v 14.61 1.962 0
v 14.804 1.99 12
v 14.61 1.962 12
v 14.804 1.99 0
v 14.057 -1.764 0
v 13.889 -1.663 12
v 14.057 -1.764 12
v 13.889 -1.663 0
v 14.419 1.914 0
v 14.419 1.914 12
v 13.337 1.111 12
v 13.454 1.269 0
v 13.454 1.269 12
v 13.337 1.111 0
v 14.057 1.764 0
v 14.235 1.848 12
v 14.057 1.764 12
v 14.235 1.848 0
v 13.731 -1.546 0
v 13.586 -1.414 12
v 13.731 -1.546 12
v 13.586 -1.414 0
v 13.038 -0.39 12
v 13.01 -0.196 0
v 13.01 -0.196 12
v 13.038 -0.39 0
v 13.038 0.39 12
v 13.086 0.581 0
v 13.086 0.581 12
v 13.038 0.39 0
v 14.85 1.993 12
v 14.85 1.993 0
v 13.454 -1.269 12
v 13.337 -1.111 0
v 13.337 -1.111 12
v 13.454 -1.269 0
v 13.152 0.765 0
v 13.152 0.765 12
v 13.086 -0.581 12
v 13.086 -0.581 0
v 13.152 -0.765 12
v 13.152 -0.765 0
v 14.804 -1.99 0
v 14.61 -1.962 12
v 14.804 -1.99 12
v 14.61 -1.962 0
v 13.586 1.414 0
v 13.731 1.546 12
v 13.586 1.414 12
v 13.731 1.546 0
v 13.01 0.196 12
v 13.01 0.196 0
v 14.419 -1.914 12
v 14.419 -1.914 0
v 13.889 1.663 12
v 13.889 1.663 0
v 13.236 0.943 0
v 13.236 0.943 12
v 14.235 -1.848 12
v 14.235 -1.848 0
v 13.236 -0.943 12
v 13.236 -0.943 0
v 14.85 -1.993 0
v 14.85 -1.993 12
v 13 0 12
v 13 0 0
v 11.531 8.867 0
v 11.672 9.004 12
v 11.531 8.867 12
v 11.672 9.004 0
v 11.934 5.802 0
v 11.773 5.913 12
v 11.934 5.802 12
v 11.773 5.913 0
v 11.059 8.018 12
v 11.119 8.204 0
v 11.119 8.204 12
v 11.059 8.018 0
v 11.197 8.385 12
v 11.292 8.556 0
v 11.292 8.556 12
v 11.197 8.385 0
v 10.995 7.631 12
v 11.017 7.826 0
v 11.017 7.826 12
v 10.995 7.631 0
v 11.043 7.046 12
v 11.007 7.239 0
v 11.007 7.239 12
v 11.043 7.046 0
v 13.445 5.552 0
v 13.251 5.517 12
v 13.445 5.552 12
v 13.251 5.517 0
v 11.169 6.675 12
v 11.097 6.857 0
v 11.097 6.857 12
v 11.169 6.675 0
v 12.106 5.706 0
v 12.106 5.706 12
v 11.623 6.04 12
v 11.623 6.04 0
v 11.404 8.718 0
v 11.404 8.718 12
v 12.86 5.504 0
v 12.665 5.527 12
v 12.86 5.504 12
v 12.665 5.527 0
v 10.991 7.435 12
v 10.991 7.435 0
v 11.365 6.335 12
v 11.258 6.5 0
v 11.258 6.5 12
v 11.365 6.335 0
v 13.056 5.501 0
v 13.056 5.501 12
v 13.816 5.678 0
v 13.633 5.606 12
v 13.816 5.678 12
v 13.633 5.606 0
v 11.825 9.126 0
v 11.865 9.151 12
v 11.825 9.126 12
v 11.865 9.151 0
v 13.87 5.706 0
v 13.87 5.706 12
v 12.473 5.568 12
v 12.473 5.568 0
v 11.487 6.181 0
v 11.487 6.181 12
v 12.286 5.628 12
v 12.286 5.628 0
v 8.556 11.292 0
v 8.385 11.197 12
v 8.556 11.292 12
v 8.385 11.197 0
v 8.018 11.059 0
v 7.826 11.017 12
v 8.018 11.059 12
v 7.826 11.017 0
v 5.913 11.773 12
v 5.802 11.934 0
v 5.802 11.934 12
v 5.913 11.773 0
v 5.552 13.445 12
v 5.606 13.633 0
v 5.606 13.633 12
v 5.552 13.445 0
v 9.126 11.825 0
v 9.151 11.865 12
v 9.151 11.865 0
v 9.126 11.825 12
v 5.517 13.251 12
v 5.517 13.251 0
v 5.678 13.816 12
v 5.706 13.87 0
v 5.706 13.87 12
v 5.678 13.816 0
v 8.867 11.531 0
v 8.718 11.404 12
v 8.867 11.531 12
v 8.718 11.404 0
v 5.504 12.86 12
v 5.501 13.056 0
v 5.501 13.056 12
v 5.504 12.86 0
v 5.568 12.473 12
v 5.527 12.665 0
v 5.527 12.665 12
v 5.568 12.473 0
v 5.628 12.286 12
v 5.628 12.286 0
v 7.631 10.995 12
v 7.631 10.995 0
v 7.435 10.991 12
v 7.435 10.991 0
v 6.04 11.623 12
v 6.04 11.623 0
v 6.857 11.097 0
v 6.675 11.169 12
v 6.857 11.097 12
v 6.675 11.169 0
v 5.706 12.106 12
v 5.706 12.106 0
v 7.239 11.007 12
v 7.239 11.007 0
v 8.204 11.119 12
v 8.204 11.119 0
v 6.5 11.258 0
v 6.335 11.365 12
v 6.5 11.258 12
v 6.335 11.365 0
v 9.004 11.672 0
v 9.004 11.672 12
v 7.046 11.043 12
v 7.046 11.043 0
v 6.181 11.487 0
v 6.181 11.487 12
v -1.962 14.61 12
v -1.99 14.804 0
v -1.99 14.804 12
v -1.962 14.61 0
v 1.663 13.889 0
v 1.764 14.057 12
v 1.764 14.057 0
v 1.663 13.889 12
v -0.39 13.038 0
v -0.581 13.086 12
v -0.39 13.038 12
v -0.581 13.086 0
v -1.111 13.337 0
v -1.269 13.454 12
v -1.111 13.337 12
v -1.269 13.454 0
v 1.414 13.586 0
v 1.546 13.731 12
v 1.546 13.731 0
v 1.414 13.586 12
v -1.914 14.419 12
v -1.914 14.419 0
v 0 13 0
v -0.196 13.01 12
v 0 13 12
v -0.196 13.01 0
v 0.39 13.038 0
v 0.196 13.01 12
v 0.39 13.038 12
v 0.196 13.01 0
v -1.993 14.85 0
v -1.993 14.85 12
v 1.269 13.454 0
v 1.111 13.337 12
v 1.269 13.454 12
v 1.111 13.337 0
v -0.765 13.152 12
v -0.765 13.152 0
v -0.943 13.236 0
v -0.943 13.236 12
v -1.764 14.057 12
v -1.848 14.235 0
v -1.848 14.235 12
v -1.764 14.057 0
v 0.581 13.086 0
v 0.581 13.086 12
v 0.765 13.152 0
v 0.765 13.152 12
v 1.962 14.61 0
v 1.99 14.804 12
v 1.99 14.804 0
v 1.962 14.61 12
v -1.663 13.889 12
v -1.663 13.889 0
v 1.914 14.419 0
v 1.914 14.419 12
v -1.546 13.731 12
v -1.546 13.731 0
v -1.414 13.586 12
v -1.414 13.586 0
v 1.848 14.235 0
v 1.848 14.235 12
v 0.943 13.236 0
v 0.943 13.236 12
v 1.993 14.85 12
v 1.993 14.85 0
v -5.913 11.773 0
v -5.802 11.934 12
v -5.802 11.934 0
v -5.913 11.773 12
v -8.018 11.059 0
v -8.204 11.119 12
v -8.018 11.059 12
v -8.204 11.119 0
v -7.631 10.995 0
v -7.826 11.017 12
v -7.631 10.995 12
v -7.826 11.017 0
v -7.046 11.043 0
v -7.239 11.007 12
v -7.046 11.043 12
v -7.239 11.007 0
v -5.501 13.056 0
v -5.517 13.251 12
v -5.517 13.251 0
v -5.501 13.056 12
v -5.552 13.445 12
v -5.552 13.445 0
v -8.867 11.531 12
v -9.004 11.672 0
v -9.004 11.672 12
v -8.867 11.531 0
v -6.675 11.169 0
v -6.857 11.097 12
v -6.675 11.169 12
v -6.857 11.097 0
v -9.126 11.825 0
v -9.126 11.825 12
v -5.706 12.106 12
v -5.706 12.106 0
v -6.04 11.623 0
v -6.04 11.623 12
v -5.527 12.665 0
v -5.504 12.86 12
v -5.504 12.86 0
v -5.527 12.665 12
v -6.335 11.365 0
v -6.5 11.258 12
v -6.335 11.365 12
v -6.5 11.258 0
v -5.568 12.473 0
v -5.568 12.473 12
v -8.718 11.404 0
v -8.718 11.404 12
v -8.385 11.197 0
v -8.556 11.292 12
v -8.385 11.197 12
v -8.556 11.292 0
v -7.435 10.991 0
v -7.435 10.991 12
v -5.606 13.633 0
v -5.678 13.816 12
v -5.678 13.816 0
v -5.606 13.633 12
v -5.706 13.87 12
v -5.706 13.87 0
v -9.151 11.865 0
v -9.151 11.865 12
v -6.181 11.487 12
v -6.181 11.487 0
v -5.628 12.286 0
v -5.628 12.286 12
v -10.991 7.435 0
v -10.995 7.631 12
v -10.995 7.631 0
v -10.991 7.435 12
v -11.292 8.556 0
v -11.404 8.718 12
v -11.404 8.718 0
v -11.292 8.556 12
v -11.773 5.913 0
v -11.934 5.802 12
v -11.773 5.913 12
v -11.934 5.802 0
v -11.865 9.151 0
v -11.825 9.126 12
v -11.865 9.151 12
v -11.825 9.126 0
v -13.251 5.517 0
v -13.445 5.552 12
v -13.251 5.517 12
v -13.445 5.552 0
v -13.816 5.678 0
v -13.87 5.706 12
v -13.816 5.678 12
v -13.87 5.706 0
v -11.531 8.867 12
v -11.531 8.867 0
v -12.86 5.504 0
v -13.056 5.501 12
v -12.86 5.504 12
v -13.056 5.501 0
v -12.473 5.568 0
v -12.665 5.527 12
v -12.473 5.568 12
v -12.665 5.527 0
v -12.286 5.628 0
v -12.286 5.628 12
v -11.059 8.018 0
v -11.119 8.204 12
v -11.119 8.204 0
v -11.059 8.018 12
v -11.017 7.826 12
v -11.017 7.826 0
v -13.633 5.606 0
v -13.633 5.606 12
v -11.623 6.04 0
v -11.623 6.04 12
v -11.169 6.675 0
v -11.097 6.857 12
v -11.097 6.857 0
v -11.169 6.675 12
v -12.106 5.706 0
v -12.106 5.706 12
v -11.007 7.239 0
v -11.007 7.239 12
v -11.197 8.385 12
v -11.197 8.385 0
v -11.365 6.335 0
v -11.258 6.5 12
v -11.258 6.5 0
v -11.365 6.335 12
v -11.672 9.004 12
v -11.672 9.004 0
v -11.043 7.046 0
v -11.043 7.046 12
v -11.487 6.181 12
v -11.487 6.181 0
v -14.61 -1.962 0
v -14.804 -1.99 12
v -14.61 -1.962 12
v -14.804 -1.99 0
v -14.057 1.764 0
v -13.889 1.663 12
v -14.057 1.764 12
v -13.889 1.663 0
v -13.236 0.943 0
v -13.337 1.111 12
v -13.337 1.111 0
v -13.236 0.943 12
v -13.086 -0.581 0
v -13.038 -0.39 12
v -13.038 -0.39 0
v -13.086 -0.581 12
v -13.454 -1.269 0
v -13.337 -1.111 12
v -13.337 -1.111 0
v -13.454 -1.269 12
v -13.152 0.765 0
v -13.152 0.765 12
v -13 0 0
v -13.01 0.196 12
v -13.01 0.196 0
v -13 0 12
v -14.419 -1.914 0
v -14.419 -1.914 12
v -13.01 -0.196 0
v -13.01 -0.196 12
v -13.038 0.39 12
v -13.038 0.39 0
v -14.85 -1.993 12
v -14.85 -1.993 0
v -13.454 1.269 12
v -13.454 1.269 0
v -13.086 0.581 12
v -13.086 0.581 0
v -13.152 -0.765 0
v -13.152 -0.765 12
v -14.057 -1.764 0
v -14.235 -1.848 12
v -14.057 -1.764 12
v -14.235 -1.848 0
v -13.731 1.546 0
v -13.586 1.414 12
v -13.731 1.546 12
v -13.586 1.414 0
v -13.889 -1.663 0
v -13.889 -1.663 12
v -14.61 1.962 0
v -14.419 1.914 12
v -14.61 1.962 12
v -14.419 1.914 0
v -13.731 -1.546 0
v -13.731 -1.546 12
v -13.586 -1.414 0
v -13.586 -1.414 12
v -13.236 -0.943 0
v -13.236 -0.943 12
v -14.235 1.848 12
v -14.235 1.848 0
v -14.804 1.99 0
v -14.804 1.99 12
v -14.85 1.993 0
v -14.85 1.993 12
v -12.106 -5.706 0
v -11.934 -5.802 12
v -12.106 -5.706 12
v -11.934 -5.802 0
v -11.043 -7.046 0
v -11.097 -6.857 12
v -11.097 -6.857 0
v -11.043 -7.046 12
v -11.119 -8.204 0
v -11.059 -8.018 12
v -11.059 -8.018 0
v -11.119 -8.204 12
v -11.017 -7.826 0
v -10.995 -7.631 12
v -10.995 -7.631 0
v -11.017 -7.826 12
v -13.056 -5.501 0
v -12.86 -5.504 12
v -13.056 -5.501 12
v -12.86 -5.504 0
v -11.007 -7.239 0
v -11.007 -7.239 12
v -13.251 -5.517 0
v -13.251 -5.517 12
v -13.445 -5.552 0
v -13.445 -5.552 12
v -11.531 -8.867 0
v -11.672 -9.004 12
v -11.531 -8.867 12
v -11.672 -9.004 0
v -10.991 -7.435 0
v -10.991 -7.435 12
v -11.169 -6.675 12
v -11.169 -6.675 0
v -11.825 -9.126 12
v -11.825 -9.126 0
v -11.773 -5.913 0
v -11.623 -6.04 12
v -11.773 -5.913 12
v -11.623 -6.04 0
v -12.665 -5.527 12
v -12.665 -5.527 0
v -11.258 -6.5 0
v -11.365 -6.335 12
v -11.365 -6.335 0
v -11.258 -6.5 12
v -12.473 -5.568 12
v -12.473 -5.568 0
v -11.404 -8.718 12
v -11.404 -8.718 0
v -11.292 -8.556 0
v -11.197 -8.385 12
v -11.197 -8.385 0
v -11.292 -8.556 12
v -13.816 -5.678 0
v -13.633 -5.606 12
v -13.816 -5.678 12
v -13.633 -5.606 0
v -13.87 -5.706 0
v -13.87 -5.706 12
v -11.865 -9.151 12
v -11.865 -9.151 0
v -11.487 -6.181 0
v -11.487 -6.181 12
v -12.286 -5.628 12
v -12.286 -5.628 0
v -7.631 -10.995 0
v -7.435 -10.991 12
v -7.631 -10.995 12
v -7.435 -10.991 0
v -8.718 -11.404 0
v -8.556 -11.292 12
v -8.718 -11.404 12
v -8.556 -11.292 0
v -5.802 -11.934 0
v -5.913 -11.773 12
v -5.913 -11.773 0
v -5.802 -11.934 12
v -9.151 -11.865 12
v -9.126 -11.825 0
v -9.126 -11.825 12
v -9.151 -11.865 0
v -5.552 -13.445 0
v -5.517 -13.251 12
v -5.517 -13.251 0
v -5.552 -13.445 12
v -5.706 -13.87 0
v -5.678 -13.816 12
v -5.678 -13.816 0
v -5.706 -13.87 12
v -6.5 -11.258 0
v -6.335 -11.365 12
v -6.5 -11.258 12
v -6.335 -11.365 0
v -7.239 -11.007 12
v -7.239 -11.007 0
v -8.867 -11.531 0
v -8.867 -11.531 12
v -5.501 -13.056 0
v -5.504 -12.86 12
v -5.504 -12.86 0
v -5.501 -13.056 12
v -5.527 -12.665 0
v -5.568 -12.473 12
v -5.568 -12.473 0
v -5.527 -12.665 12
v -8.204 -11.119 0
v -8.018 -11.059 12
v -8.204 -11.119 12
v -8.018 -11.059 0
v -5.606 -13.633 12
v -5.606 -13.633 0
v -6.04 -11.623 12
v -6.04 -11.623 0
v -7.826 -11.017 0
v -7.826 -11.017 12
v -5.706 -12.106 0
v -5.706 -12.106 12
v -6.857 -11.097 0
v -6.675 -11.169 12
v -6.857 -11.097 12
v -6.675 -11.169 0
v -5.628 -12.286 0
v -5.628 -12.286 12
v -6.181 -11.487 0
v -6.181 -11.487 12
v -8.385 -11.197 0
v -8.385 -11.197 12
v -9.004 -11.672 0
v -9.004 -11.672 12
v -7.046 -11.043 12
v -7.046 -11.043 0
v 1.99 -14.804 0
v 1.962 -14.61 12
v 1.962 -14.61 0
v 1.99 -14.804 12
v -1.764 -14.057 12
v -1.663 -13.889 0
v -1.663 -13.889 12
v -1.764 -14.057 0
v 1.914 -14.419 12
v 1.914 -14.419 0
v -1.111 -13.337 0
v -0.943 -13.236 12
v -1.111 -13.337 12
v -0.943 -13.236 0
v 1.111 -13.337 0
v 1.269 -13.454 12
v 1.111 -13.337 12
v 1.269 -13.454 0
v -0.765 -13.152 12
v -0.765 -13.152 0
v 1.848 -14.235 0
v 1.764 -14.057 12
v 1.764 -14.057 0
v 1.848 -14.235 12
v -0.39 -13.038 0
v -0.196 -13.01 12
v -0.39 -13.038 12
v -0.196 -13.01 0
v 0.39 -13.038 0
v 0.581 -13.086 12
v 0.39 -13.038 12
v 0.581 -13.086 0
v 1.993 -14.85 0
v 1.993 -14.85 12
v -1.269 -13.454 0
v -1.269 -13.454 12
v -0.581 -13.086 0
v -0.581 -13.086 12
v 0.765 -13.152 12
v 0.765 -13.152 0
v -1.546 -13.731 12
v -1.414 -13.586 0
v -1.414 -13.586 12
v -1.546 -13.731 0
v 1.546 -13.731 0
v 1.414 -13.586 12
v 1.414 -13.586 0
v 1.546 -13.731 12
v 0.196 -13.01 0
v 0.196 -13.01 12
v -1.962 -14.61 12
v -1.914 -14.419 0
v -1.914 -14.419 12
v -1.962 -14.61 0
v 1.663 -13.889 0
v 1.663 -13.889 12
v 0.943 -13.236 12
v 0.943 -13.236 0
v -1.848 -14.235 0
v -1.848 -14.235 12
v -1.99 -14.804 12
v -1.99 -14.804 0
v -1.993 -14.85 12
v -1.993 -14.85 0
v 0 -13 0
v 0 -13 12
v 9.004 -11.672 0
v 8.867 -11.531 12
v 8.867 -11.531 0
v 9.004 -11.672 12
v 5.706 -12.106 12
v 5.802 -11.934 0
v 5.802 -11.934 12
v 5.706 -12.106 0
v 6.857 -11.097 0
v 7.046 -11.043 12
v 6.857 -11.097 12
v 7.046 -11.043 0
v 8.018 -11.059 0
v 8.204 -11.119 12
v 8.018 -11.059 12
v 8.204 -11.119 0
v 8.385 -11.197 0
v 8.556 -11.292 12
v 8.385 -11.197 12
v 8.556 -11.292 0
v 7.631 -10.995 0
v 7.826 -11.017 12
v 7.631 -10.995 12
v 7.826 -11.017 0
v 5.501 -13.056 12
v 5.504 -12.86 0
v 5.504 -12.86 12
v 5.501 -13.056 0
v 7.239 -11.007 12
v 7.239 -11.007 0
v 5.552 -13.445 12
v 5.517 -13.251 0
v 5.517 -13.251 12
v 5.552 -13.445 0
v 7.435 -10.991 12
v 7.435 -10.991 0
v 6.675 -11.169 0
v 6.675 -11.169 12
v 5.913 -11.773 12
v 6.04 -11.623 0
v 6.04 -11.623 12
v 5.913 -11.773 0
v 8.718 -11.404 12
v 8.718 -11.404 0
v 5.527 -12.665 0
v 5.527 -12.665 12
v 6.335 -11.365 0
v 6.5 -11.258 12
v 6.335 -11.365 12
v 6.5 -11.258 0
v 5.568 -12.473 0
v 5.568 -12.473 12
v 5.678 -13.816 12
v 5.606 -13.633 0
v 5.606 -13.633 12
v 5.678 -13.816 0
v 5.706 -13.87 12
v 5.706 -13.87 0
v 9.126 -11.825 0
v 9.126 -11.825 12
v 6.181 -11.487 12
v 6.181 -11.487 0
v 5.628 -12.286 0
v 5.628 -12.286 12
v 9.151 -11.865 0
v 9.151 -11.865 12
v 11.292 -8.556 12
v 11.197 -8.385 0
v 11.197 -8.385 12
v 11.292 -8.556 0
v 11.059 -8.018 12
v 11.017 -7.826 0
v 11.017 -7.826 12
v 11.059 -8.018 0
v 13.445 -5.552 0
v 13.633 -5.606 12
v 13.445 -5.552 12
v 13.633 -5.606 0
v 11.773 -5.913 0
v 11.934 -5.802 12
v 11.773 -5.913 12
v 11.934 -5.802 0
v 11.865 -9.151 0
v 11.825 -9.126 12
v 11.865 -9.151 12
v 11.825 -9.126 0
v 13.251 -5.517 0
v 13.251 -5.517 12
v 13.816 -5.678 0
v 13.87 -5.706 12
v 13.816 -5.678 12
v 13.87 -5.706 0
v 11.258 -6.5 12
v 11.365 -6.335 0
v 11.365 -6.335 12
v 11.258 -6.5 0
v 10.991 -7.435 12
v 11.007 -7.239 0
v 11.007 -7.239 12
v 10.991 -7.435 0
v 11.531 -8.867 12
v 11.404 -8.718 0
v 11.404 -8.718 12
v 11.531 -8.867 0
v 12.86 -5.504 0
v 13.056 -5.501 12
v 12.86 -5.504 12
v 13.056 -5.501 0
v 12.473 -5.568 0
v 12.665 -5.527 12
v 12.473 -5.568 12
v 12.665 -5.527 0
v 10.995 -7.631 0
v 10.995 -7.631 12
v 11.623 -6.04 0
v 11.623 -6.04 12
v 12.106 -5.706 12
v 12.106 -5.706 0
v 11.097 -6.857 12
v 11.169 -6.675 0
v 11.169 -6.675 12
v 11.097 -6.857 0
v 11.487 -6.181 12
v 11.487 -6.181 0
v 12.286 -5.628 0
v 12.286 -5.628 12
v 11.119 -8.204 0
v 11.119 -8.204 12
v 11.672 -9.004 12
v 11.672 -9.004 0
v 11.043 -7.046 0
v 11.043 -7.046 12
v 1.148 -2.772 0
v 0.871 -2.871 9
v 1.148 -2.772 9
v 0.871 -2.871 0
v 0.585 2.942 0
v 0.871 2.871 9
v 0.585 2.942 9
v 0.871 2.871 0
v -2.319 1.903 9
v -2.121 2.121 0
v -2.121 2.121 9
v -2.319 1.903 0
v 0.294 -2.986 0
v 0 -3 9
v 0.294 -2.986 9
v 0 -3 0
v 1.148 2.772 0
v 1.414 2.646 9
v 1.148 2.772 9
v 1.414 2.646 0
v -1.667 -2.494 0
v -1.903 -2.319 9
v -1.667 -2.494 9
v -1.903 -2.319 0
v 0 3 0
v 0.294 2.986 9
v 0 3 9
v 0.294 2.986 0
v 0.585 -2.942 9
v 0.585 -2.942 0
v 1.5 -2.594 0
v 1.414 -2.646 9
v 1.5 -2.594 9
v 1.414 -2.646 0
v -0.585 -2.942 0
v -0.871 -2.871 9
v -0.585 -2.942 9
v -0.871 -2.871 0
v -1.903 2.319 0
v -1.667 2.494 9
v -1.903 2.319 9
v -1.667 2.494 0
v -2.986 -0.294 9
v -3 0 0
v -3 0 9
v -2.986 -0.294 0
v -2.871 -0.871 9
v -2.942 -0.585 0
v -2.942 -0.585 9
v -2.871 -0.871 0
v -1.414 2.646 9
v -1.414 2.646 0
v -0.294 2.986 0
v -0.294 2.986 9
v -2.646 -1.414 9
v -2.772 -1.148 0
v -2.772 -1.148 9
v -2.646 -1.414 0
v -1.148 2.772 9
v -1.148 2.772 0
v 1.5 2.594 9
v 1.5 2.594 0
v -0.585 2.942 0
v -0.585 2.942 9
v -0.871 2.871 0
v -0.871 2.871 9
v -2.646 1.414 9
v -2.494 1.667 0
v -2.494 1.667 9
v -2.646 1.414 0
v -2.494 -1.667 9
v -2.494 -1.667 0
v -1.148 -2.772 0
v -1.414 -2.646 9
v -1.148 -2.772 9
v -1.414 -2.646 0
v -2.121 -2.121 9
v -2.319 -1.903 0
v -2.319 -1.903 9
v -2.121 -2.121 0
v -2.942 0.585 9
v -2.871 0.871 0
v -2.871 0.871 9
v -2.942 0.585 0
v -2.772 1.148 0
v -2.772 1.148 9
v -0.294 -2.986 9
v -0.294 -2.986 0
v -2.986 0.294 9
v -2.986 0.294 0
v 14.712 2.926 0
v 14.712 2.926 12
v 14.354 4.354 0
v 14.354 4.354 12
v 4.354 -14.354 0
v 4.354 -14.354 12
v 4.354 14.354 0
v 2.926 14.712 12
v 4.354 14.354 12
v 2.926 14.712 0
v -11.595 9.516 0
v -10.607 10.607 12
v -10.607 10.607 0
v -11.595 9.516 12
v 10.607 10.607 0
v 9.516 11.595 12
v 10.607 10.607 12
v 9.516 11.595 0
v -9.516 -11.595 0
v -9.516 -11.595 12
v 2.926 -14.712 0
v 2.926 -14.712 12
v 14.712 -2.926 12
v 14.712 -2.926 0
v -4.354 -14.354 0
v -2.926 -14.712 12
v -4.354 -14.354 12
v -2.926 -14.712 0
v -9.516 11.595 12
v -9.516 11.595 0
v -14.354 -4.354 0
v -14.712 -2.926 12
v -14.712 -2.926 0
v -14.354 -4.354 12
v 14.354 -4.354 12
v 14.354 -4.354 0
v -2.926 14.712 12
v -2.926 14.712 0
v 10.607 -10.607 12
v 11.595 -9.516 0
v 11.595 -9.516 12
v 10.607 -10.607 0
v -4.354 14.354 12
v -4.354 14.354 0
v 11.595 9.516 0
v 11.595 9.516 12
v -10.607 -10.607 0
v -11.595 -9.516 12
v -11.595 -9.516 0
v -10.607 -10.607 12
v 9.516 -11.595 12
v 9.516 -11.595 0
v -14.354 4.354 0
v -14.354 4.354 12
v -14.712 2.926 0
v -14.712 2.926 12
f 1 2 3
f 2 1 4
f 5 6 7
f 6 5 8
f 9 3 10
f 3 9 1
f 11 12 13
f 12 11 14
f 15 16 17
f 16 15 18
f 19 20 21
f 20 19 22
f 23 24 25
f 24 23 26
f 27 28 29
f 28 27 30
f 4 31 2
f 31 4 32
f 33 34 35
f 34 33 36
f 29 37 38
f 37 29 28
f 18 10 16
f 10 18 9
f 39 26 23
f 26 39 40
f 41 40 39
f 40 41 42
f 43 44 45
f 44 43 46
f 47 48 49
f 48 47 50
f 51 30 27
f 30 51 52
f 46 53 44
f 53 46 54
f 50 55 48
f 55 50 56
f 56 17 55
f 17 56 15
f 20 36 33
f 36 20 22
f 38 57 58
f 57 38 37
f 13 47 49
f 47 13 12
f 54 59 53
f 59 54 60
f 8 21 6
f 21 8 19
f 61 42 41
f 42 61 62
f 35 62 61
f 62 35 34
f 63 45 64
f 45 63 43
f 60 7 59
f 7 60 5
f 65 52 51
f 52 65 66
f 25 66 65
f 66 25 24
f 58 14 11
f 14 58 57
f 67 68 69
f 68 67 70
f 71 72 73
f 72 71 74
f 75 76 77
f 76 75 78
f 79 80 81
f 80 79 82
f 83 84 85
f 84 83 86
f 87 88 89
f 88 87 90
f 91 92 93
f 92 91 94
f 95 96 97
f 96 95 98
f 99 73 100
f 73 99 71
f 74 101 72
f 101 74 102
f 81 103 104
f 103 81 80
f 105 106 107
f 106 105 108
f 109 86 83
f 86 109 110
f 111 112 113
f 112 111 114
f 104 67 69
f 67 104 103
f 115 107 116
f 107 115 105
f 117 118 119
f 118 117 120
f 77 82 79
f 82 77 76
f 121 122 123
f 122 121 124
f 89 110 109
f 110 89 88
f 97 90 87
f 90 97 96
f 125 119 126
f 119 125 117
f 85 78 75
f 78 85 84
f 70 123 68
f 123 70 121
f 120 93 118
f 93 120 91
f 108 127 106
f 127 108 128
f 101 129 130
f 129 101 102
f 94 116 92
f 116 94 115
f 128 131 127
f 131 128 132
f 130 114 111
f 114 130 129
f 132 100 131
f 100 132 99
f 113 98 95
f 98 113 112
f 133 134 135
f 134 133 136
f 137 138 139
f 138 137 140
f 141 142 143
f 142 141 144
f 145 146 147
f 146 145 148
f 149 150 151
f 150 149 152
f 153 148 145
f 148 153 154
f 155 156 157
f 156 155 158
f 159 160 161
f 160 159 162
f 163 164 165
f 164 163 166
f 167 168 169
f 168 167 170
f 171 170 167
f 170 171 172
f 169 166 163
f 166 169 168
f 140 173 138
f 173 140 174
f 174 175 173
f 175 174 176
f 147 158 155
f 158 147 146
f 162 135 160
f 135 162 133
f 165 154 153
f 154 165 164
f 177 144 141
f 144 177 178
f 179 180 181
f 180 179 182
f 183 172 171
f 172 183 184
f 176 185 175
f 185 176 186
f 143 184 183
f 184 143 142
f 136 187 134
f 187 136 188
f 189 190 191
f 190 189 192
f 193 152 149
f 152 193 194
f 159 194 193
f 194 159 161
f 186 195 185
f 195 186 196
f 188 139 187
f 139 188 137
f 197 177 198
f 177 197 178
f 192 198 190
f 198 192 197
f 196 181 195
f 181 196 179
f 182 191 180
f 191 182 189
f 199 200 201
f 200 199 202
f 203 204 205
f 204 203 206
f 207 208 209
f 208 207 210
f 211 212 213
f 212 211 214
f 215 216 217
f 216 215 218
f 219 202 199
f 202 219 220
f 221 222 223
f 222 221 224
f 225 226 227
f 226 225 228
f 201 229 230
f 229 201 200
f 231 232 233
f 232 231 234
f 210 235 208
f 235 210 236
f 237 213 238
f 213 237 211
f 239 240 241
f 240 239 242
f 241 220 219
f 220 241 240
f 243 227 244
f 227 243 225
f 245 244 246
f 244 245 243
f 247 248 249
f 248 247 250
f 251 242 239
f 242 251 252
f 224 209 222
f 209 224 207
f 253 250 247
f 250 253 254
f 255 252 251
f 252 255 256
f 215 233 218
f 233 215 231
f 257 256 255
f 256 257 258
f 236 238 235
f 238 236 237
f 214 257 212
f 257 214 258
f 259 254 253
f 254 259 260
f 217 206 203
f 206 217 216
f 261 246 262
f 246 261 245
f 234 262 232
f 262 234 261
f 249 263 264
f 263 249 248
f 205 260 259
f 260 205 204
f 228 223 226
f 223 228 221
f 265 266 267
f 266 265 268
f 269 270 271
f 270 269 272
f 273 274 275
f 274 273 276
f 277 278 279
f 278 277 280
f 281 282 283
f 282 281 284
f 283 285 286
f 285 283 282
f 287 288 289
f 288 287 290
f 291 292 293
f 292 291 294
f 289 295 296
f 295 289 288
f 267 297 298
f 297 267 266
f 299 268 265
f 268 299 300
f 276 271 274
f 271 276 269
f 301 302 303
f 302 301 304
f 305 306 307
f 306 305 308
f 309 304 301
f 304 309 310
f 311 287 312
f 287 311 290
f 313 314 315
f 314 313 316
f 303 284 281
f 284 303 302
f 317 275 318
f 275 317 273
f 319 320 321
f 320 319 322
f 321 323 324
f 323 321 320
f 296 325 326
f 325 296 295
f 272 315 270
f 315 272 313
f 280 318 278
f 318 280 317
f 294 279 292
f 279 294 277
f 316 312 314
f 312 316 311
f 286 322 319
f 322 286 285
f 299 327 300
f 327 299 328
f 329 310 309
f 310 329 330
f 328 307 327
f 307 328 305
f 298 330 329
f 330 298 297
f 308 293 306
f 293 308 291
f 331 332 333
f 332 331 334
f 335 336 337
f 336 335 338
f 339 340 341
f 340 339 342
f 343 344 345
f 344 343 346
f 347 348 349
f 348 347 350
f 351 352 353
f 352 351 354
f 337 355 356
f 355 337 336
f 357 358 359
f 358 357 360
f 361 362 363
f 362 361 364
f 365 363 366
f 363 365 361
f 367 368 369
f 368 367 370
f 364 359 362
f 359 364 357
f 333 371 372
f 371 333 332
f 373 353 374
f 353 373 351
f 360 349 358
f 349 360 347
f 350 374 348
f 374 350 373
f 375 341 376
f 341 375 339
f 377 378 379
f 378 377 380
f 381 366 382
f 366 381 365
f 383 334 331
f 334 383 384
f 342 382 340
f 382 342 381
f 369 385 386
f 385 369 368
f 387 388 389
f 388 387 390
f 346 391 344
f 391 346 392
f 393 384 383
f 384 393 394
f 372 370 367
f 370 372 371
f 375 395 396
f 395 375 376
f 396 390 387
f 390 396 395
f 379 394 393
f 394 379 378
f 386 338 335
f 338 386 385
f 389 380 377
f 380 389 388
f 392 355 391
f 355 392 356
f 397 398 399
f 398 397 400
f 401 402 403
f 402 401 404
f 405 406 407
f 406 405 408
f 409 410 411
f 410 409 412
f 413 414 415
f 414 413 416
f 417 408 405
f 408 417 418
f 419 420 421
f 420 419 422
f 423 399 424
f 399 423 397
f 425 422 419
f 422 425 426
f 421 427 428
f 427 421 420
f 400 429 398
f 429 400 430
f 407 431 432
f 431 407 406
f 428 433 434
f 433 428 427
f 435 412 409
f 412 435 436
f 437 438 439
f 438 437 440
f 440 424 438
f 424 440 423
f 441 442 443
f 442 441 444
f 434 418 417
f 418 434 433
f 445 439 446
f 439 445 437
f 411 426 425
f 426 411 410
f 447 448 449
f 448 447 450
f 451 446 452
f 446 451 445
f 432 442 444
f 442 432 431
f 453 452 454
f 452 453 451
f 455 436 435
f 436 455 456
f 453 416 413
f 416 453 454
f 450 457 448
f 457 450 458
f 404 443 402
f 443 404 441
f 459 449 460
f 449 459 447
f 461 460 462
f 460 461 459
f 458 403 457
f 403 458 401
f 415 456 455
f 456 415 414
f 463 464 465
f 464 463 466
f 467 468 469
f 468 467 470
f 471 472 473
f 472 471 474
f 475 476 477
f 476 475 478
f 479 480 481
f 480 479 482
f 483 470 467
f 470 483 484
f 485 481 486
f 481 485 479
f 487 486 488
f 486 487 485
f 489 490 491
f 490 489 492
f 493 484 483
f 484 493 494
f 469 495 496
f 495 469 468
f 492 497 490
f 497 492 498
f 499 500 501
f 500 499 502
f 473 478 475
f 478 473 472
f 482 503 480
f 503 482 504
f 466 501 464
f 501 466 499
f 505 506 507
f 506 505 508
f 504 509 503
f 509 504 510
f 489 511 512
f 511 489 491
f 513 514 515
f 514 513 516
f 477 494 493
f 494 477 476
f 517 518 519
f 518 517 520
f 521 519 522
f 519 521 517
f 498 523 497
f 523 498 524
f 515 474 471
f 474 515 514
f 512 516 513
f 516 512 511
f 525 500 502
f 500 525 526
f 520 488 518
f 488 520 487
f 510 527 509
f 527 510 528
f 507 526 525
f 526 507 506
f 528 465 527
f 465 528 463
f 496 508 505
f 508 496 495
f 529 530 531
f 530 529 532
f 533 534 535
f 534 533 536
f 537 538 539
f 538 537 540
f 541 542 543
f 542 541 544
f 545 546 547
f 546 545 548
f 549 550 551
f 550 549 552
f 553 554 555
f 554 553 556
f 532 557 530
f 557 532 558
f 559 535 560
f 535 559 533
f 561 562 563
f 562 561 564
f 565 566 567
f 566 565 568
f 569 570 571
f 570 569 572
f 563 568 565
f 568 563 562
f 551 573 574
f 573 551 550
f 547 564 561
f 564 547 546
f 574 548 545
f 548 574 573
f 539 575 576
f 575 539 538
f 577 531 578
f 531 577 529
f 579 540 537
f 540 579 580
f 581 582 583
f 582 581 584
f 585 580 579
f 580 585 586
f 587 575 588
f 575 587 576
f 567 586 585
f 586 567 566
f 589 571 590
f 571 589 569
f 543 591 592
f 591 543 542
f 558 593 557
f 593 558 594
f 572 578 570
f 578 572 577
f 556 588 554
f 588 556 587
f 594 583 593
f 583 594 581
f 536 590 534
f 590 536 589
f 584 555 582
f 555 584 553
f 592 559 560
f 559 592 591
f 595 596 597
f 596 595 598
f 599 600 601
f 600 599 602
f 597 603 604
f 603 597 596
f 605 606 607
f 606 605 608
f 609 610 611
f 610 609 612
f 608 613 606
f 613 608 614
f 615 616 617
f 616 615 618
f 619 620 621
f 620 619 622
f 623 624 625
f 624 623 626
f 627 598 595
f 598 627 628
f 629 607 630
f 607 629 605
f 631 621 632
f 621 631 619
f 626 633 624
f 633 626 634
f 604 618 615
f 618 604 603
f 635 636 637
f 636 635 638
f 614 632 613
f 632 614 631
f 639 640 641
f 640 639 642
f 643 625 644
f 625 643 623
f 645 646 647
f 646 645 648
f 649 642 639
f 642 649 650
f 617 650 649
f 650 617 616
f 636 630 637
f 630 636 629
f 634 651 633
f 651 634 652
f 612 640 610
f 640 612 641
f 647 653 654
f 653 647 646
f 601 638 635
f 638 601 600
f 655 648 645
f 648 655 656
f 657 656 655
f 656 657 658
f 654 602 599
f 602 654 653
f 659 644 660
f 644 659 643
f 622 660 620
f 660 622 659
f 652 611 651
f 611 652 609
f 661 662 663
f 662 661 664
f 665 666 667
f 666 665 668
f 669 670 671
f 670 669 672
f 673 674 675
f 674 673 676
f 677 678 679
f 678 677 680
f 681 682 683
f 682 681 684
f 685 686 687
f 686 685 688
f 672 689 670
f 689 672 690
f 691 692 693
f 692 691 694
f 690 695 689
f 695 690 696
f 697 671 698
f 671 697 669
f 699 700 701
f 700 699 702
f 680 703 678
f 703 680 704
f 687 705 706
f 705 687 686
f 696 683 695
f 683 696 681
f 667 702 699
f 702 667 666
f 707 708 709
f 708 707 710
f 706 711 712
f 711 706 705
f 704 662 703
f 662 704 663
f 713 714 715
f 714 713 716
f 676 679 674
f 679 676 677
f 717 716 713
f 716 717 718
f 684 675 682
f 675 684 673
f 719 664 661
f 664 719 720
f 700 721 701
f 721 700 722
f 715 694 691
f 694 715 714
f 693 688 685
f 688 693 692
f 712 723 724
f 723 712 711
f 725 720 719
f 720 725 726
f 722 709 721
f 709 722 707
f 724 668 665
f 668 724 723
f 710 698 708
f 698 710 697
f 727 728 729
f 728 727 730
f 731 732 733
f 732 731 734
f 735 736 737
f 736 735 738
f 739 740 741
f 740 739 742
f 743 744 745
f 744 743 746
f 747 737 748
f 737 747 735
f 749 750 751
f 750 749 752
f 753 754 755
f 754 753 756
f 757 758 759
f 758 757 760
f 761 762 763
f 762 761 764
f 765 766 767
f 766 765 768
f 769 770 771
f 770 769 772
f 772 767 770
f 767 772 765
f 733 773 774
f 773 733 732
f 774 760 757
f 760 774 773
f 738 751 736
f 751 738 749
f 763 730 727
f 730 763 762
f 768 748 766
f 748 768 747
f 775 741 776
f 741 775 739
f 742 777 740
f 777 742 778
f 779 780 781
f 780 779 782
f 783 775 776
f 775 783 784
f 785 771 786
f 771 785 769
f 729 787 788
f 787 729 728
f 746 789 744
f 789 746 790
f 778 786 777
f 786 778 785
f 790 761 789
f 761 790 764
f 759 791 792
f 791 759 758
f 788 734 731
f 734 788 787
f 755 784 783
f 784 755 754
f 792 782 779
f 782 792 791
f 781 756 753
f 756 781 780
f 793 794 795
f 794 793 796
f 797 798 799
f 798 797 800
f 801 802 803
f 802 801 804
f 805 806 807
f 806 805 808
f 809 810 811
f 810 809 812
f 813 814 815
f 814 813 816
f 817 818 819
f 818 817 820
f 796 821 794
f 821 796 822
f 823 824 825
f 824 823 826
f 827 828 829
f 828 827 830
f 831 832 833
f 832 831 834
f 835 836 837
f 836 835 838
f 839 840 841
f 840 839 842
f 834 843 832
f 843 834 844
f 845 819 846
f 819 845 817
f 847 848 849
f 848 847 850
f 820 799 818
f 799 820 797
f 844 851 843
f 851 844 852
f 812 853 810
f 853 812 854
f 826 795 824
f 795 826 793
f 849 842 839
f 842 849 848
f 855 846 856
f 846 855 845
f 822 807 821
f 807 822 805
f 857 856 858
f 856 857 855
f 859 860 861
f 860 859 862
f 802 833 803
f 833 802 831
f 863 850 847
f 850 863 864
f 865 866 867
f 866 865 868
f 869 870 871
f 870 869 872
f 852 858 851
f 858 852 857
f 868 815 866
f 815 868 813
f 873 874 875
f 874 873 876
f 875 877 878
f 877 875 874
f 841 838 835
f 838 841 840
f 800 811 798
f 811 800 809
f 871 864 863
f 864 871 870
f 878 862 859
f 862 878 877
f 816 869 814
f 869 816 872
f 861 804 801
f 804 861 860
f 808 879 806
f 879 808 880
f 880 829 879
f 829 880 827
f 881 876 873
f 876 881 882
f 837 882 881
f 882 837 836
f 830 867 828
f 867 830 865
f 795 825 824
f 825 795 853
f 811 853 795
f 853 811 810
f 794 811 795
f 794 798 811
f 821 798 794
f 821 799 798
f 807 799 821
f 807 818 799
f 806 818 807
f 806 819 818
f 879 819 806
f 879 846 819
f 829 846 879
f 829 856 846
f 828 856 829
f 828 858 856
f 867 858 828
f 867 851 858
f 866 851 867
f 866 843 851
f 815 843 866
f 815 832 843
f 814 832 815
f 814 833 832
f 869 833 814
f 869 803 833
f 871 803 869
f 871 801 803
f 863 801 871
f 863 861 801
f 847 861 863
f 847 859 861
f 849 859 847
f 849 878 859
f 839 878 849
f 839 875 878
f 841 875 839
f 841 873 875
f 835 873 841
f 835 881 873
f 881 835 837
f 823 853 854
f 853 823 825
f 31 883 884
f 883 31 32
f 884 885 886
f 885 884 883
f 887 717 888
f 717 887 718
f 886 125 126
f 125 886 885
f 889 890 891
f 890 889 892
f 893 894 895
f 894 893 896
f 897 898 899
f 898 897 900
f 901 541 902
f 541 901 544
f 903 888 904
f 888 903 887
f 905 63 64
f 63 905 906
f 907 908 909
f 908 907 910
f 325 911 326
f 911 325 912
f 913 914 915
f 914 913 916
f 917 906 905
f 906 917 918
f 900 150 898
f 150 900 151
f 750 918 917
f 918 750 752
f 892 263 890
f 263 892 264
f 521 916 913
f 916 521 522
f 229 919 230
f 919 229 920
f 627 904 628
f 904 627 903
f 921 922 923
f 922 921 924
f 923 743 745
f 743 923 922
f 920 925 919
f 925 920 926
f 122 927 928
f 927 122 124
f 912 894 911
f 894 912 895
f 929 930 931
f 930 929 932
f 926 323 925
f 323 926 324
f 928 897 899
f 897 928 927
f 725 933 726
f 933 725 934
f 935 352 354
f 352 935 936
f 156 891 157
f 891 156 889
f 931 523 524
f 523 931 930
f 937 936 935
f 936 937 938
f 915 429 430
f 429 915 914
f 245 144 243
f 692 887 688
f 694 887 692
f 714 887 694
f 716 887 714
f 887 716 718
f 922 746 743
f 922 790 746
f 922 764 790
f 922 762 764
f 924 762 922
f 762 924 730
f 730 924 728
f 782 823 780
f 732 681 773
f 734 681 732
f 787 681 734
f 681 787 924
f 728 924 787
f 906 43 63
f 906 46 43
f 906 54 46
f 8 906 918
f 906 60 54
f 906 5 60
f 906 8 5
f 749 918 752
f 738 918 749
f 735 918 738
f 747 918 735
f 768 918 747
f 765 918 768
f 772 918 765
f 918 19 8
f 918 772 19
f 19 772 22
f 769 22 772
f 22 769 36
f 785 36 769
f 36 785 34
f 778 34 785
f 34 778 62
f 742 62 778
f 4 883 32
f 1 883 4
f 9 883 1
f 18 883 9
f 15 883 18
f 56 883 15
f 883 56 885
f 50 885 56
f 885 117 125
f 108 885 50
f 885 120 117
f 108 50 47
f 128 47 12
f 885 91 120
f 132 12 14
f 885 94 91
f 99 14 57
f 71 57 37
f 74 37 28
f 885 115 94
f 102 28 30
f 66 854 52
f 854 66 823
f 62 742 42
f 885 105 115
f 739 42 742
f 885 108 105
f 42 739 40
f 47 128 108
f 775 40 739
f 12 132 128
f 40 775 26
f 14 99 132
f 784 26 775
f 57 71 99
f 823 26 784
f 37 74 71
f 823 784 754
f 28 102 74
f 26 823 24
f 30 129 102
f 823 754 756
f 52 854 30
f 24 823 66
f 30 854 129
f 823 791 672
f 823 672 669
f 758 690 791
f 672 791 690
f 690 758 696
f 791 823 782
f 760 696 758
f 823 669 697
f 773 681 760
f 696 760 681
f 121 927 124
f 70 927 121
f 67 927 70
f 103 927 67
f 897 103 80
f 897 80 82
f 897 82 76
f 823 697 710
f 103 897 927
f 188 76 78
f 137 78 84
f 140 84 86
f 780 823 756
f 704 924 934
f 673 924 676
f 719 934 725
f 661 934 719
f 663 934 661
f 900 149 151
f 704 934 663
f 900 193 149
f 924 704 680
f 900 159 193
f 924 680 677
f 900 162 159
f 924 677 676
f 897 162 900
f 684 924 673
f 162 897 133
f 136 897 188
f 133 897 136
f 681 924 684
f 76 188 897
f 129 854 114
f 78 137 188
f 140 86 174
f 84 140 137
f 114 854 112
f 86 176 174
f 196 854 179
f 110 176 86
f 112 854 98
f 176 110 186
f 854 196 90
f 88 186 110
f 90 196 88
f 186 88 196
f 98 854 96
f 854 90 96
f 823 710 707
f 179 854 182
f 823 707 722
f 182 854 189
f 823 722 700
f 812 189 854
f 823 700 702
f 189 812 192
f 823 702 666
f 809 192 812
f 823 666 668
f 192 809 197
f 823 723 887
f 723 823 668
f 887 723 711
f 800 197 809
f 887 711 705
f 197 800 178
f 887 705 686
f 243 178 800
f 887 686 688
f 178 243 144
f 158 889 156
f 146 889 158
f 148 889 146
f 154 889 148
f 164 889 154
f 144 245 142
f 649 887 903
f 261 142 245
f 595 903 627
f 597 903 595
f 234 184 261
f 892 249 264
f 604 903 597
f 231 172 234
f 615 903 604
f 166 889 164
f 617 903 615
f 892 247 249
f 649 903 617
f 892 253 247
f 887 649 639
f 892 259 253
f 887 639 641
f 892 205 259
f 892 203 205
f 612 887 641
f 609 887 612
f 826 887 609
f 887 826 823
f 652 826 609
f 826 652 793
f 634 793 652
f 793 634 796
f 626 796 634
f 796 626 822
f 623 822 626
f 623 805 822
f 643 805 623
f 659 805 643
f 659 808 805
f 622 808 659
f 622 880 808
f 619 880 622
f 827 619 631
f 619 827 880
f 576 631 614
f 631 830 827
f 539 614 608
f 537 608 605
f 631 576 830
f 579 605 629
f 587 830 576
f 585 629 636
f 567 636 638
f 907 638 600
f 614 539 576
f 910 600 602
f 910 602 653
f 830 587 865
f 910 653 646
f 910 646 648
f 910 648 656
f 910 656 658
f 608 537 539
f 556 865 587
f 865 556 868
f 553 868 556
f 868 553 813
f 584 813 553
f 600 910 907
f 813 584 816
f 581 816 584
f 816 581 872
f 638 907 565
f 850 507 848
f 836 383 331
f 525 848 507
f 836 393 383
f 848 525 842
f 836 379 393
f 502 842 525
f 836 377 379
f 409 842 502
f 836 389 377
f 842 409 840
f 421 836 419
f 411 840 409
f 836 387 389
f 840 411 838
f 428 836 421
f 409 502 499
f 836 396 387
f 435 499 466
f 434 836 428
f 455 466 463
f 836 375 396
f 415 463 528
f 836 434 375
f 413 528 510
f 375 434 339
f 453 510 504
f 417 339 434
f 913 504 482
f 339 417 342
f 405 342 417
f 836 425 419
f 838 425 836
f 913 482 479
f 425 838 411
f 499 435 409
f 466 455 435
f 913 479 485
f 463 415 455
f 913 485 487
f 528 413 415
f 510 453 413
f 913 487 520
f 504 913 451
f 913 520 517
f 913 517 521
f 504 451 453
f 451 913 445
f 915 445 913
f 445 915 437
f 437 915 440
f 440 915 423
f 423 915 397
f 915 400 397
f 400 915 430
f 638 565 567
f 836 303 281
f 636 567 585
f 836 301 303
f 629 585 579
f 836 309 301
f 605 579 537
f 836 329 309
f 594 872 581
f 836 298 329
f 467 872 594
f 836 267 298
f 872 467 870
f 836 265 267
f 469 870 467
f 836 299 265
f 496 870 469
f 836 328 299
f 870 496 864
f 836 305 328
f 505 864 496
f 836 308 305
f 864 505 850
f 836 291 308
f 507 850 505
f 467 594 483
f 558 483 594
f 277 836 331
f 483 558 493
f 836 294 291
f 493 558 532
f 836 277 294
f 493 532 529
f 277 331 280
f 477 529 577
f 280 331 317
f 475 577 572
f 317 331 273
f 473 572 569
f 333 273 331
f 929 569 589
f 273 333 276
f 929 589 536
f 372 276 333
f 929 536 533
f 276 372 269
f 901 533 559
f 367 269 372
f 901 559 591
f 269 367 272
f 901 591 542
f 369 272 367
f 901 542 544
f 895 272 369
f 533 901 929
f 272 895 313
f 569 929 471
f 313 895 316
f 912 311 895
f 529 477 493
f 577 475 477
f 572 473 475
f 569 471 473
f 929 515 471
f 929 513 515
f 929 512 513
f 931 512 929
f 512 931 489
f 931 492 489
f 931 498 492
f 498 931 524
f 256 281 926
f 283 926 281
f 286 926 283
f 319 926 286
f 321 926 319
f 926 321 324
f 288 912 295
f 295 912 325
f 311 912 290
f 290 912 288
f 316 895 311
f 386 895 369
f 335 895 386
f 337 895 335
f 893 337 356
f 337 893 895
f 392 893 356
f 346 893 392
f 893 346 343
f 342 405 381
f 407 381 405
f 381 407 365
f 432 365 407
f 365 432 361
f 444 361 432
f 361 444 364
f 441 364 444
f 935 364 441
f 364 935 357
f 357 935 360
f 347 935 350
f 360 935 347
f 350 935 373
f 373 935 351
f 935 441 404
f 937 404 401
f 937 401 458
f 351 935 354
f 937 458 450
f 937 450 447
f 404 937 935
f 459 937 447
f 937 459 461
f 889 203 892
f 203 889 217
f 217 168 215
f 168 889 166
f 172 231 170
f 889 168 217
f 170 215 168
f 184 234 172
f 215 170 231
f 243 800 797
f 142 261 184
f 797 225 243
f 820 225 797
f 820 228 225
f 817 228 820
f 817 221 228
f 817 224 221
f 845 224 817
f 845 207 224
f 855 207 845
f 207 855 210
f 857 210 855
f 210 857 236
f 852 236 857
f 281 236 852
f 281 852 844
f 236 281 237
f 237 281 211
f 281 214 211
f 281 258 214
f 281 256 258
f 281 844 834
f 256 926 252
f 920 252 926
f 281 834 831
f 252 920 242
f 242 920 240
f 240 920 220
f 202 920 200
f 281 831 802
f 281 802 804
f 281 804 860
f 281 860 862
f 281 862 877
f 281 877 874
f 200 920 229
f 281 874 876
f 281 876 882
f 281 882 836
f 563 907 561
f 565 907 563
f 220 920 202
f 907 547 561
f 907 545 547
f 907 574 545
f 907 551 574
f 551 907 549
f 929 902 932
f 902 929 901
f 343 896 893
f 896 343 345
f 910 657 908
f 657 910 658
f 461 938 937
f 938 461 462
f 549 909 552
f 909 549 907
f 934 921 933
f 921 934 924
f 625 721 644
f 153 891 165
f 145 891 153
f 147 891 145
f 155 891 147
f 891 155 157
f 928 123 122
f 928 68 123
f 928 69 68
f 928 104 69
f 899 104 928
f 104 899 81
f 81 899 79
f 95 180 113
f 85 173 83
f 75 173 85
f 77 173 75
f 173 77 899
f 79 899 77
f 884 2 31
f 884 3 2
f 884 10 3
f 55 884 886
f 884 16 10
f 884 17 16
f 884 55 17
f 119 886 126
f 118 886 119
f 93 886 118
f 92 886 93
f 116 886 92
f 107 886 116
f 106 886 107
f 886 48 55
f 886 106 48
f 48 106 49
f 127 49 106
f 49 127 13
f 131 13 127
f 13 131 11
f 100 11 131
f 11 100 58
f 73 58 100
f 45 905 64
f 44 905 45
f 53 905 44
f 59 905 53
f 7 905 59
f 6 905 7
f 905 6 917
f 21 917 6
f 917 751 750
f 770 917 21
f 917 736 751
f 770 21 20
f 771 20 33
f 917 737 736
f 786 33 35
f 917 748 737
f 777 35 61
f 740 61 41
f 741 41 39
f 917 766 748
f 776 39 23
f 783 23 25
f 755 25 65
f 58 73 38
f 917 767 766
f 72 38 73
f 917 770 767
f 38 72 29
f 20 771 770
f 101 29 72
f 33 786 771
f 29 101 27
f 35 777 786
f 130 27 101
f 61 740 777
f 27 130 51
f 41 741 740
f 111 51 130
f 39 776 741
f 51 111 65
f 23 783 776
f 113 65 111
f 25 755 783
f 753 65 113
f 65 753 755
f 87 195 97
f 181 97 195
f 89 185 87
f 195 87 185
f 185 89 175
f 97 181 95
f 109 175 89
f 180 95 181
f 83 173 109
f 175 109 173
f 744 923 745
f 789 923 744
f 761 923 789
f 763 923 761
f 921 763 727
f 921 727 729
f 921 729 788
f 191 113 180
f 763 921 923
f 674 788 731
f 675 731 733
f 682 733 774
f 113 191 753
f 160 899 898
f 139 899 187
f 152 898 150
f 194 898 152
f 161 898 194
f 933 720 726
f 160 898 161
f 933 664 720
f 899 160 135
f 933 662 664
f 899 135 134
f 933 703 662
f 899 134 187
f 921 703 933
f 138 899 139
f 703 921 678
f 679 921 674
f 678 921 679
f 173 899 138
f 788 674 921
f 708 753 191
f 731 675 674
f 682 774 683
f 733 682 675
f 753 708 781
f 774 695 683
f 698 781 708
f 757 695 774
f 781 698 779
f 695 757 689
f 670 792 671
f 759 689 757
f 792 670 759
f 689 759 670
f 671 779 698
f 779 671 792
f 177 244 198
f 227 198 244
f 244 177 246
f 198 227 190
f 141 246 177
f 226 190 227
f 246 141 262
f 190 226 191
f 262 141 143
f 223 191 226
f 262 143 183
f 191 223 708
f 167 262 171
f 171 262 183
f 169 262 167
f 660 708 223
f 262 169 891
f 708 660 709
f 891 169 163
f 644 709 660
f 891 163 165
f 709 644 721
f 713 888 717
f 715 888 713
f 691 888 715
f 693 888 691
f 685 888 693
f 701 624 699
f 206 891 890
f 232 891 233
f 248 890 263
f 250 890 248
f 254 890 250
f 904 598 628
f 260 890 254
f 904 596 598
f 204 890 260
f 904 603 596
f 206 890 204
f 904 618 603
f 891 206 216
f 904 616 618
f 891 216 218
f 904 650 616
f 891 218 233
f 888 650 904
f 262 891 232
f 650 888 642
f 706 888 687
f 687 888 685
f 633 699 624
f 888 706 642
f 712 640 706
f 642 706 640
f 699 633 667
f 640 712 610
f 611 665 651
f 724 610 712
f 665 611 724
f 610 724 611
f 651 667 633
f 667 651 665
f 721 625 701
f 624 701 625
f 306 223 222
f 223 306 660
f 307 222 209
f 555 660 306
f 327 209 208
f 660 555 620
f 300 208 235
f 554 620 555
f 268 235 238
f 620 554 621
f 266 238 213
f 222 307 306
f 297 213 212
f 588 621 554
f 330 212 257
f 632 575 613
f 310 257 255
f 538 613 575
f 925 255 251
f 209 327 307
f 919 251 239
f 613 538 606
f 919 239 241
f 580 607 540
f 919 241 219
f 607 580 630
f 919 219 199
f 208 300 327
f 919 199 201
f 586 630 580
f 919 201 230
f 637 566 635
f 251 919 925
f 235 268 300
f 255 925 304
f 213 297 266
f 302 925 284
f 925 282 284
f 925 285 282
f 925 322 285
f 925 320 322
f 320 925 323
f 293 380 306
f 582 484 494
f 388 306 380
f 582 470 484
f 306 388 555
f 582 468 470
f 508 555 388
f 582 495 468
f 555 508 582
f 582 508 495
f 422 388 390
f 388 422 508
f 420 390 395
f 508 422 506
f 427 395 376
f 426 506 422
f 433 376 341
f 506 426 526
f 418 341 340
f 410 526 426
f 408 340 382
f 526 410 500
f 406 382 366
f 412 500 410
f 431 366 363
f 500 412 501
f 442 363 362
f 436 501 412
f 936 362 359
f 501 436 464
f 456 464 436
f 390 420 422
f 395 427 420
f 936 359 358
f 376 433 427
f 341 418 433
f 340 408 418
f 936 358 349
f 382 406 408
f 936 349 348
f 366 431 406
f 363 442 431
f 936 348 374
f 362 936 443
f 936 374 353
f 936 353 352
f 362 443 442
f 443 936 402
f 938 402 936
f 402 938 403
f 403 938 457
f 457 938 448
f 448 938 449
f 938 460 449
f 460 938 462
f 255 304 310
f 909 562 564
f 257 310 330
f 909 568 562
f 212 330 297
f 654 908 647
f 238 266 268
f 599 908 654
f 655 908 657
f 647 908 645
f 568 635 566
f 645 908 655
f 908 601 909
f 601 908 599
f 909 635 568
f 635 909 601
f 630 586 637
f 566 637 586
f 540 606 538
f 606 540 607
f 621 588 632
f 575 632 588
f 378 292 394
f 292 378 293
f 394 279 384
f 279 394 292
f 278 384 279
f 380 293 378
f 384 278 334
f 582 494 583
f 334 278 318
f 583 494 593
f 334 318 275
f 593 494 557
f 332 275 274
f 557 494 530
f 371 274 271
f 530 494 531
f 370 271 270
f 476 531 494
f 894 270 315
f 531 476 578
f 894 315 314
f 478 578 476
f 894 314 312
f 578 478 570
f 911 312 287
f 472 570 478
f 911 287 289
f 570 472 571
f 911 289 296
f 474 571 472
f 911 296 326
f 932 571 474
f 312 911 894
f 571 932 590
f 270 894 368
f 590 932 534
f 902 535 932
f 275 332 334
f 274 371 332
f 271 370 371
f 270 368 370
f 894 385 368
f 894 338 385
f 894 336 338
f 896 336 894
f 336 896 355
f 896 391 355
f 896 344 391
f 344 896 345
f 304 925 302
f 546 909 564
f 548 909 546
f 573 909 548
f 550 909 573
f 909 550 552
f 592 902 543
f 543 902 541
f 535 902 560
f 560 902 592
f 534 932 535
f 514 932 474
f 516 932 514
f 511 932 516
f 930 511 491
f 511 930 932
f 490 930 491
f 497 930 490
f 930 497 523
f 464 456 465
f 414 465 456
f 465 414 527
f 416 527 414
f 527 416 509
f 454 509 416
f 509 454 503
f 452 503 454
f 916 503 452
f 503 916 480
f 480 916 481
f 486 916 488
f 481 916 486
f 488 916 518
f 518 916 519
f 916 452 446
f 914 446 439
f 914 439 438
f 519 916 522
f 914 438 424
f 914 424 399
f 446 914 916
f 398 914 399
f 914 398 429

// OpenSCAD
// Customizable knob with grip notches and a D-shaft bore
radius = 15;     // [8:40]
height = 12;     // [5:30]
notches = 12;    // [0:36]
notch_r = 2;     // [1:0.5:5]
shaft_d = 6;     // [3:0.5:10]
flat = 1.5;      // distance from the shaft axis to the flat
bore_depth = 9;

$fn = 64;

module d_shaft(d, depth, flat) {
  difference() {
    cylinder(d = d, h = depth);
    translate([flat, -d, -1]) cube([2 * d, 2 * d, depth + 2]);
  }
}

difference() {
  cylinder(r = radius, h = height);
  for (i = [0 : notches - 1])
    rotate([0, 0, i * 360 / notches]) translate([radius, 0, -1]) cylinder(r = notch_r, h = height + 2);
  translate([0, 0, -1]) d_shaft(shaft_d, bore_depth + 1, flat);
}
